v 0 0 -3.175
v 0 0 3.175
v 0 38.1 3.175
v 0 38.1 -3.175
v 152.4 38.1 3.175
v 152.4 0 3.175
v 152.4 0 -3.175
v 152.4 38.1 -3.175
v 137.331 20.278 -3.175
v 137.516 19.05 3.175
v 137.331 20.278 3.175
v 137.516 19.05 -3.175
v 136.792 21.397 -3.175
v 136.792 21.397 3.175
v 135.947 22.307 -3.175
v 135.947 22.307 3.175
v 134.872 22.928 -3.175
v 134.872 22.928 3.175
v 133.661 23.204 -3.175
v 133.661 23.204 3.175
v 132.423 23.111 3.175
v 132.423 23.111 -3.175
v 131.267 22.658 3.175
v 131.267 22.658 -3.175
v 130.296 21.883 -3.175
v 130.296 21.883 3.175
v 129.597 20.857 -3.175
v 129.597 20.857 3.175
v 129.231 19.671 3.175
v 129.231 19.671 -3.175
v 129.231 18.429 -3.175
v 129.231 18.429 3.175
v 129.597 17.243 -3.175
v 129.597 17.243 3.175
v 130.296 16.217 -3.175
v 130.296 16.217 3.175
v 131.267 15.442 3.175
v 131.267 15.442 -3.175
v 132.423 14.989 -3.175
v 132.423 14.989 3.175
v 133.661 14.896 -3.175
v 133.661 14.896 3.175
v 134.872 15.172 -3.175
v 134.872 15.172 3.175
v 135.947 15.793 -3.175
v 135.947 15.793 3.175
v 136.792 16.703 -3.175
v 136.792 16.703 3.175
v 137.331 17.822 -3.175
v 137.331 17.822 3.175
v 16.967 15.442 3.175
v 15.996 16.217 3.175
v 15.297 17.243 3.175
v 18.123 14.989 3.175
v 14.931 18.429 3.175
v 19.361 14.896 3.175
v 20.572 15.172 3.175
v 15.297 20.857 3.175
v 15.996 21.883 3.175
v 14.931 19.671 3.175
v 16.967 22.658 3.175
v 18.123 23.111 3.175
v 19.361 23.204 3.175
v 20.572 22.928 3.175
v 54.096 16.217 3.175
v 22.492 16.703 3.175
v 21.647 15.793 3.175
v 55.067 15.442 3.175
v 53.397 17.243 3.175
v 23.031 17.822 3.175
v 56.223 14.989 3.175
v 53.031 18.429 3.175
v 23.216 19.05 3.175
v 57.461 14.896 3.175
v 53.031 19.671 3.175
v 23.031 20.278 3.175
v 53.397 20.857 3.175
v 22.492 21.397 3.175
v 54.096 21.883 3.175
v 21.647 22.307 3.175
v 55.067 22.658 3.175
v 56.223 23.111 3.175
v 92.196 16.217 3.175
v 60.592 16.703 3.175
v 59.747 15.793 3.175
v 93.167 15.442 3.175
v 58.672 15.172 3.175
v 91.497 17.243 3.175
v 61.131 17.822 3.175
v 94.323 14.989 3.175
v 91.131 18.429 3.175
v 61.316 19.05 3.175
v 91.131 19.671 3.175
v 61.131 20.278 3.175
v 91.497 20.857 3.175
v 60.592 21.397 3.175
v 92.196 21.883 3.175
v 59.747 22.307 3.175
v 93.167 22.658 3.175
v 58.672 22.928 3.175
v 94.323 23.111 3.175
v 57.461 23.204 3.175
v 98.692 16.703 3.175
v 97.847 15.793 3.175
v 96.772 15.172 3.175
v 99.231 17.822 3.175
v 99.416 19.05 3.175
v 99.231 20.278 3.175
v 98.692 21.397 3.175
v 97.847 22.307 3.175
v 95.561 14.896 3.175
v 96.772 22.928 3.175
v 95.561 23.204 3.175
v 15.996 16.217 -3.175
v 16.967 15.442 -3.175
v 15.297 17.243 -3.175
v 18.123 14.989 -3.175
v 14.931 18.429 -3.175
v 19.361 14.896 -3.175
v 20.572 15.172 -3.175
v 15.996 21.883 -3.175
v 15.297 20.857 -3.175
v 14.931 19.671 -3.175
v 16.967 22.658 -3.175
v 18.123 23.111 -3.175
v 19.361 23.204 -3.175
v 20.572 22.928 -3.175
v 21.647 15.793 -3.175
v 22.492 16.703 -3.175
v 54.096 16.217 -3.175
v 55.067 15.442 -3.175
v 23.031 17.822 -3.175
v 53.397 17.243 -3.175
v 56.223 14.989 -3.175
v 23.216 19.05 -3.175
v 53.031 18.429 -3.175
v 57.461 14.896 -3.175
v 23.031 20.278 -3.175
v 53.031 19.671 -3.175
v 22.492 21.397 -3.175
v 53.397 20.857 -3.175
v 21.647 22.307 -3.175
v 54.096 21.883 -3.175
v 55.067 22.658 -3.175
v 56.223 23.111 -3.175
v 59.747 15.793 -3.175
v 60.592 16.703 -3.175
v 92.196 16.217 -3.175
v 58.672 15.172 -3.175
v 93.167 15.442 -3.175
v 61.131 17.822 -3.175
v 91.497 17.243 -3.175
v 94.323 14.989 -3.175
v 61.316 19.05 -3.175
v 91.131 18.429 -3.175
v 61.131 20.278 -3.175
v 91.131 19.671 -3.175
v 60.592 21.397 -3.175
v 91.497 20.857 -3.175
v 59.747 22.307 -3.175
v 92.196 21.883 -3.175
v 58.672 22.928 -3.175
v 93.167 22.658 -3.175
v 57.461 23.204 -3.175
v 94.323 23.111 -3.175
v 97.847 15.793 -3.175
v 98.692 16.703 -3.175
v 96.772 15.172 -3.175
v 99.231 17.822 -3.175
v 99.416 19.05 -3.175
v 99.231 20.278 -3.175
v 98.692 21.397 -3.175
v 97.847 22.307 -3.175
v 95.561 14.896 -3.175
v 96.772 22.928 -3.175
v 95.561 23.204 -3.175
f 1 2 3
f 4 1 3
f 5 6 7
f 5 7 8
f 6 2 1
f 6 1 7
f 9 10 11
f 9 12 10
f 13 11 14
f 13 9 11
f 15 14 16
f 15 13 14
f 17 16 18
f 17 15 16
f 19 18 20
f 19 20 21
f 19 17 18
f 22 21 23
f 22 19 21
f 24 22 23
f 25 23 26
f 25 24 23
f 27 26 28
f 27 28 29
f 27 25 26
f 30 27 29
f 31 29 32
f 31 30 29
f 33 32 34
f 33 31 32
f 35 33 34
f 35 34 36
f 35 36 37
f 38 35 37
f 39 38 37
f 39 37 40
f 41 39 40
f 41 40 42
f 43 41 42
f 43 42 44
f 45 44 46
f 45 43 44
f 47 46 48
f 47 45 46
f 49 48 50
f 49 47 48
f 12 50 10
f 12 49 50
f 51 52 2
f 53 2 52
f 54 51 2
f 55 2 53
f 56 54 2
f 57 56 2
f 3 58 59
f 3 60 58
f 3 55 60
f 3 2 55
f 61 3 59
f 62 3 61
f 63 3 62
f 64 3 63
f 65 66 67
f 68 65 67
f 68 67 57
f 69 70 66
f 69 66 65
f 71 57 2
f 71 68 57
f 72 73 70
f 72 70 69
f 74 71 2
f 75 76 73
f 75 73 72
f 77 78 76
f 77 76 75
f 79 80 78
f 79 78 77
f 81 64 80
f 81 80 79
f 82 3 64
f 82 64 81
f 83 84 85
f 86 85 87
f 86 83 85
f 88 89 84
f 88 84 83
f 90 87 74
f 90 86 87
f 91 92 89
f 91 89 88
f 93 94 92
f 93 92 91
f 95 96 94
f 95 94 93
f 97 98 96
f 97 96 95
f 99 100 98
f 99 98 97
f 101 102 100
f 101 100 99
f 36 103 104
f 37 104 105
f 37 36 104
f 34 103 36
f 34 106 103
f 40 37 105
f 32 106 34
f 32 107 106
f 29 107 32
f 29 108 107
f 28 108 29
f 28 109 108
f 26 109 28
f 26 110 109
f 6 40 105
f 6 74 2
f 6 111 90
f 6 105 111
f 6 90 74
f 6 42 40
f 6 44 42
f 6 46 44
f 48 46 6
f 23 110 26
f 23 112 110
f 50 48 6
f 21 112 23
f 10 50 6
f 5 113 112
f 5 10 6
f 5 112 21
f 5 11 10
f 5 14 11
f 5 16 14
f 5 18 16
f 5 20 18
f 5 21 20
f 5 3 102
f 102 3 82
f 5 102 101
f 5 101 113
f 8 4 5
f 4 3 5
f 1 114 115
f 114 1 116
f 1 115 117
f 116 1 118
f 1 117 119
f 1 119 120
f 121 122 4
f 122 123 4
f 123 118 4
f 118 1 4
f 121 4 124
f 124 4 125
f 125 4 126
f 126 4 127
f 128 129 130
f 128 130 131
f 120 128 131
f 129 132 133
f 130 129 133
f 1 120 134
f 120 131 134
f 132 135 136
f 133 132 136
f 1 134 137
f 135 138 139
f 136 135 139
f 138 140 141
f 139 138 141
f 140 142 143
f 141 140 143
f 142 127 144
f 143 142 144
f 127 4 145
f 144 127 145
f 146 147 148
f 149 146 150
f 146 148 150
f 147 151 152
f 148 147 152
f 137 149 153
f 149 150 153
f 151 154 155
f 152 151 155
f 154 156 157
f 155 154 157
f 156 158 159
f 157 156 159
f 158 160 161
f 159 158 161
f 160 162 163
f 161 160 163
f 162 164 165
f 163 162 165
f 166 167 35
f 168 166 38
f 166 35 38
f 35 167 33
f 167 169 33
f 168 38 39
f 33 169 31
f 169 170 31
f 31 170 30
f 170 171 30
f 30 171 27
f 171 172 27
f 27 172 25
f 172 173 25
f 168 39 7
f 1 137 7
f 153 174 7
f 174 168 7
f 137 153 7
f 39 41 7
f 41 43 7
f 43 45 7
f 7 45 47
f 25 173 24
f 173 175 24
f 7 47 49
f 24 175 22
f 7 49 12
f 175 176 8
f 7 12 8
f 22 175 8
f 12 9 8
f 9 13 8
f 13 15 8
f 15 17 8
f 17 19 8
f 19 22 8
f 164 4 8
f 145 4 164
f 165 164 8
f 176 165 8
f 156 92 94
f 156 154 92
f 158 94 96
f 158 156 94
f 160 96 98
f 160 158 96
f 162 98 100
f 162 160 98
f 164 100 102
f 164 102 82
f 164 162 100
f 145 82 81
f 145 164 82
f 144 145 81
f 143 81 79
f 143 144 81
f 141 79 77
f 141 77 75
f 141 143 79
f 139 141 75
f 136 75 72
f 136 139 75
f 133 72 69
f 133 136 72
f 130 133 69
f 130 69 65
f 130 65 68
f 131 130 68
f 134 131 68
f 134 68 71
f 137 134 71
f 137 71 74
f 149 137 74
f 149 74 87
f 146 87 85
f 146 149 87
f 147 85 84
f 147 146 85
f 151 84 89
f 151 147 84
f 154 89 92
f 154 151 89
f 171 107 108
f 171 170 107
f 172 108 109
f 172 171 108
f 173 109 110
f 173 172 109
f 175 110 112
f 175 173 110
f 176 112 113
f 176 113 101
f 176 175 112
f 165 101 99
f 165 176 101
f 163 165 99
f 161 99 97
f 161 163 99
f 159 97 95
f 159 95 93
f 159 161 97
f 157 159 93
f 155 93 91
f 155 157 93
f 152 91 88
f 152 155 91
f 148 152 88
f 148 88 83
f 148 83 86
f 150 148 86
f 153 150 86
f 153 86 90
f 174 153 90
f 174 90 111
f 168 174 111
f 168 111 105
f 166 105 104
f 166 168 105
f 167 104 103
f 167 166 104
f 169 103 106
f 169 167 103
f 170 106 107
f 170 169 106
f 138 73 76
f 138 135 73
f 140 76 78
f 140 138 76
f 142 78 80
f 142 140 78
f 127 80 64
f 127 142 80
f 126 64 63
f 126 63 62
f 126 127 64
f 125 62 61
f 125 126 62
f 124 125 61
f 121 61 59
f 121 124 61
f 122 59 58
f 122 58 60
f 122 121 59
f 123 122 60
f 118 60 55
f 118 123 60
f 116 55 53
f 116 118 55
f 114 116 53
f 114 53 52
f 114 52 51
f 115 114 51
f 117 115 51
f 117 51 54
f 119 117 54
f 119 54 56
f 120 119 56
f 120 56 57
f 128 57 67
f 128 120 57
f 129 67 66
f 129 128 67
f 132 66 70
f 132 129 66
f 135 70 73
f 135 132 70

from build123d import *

# Parameters (mm, degrees)
SKETCH1_W           = 152.4
SKETCH1_H           = 38.1
SKETCH1_R           = 4.1656
BOSS_EXTRUDE1_DEPTH = 3.175


with BuildPart() as part:
    # Sketch1 → Boss-Extrude1 (new, symmetric)
    with BuildSketch(Plane.XY):
        with Locations((76.2, 19.05)):
            Rectangle(SKETCH1_W, SKETCH1_H)
        with Locations((19.05, 19.05)):
            Circle(SKETCH1_R, mode=Mode.SUBTRACT)
        with Locations((57.15, 19.05)):
            Circle(SKETCH1_R, mode=Mode.SUBTRACT)
        with Locations((95.25, 19.05)):
            Circle(SKETCH1_R, mode=Mode.SUBTRACT)
        with Locations((133.35, 19.05)):
            Circle(SKETCH1_R, mode=Mode.SUBTRACT)
    extrude(amount=BOSS_EXTRUDE1_DEPTH, both=True)


solid = part.part
